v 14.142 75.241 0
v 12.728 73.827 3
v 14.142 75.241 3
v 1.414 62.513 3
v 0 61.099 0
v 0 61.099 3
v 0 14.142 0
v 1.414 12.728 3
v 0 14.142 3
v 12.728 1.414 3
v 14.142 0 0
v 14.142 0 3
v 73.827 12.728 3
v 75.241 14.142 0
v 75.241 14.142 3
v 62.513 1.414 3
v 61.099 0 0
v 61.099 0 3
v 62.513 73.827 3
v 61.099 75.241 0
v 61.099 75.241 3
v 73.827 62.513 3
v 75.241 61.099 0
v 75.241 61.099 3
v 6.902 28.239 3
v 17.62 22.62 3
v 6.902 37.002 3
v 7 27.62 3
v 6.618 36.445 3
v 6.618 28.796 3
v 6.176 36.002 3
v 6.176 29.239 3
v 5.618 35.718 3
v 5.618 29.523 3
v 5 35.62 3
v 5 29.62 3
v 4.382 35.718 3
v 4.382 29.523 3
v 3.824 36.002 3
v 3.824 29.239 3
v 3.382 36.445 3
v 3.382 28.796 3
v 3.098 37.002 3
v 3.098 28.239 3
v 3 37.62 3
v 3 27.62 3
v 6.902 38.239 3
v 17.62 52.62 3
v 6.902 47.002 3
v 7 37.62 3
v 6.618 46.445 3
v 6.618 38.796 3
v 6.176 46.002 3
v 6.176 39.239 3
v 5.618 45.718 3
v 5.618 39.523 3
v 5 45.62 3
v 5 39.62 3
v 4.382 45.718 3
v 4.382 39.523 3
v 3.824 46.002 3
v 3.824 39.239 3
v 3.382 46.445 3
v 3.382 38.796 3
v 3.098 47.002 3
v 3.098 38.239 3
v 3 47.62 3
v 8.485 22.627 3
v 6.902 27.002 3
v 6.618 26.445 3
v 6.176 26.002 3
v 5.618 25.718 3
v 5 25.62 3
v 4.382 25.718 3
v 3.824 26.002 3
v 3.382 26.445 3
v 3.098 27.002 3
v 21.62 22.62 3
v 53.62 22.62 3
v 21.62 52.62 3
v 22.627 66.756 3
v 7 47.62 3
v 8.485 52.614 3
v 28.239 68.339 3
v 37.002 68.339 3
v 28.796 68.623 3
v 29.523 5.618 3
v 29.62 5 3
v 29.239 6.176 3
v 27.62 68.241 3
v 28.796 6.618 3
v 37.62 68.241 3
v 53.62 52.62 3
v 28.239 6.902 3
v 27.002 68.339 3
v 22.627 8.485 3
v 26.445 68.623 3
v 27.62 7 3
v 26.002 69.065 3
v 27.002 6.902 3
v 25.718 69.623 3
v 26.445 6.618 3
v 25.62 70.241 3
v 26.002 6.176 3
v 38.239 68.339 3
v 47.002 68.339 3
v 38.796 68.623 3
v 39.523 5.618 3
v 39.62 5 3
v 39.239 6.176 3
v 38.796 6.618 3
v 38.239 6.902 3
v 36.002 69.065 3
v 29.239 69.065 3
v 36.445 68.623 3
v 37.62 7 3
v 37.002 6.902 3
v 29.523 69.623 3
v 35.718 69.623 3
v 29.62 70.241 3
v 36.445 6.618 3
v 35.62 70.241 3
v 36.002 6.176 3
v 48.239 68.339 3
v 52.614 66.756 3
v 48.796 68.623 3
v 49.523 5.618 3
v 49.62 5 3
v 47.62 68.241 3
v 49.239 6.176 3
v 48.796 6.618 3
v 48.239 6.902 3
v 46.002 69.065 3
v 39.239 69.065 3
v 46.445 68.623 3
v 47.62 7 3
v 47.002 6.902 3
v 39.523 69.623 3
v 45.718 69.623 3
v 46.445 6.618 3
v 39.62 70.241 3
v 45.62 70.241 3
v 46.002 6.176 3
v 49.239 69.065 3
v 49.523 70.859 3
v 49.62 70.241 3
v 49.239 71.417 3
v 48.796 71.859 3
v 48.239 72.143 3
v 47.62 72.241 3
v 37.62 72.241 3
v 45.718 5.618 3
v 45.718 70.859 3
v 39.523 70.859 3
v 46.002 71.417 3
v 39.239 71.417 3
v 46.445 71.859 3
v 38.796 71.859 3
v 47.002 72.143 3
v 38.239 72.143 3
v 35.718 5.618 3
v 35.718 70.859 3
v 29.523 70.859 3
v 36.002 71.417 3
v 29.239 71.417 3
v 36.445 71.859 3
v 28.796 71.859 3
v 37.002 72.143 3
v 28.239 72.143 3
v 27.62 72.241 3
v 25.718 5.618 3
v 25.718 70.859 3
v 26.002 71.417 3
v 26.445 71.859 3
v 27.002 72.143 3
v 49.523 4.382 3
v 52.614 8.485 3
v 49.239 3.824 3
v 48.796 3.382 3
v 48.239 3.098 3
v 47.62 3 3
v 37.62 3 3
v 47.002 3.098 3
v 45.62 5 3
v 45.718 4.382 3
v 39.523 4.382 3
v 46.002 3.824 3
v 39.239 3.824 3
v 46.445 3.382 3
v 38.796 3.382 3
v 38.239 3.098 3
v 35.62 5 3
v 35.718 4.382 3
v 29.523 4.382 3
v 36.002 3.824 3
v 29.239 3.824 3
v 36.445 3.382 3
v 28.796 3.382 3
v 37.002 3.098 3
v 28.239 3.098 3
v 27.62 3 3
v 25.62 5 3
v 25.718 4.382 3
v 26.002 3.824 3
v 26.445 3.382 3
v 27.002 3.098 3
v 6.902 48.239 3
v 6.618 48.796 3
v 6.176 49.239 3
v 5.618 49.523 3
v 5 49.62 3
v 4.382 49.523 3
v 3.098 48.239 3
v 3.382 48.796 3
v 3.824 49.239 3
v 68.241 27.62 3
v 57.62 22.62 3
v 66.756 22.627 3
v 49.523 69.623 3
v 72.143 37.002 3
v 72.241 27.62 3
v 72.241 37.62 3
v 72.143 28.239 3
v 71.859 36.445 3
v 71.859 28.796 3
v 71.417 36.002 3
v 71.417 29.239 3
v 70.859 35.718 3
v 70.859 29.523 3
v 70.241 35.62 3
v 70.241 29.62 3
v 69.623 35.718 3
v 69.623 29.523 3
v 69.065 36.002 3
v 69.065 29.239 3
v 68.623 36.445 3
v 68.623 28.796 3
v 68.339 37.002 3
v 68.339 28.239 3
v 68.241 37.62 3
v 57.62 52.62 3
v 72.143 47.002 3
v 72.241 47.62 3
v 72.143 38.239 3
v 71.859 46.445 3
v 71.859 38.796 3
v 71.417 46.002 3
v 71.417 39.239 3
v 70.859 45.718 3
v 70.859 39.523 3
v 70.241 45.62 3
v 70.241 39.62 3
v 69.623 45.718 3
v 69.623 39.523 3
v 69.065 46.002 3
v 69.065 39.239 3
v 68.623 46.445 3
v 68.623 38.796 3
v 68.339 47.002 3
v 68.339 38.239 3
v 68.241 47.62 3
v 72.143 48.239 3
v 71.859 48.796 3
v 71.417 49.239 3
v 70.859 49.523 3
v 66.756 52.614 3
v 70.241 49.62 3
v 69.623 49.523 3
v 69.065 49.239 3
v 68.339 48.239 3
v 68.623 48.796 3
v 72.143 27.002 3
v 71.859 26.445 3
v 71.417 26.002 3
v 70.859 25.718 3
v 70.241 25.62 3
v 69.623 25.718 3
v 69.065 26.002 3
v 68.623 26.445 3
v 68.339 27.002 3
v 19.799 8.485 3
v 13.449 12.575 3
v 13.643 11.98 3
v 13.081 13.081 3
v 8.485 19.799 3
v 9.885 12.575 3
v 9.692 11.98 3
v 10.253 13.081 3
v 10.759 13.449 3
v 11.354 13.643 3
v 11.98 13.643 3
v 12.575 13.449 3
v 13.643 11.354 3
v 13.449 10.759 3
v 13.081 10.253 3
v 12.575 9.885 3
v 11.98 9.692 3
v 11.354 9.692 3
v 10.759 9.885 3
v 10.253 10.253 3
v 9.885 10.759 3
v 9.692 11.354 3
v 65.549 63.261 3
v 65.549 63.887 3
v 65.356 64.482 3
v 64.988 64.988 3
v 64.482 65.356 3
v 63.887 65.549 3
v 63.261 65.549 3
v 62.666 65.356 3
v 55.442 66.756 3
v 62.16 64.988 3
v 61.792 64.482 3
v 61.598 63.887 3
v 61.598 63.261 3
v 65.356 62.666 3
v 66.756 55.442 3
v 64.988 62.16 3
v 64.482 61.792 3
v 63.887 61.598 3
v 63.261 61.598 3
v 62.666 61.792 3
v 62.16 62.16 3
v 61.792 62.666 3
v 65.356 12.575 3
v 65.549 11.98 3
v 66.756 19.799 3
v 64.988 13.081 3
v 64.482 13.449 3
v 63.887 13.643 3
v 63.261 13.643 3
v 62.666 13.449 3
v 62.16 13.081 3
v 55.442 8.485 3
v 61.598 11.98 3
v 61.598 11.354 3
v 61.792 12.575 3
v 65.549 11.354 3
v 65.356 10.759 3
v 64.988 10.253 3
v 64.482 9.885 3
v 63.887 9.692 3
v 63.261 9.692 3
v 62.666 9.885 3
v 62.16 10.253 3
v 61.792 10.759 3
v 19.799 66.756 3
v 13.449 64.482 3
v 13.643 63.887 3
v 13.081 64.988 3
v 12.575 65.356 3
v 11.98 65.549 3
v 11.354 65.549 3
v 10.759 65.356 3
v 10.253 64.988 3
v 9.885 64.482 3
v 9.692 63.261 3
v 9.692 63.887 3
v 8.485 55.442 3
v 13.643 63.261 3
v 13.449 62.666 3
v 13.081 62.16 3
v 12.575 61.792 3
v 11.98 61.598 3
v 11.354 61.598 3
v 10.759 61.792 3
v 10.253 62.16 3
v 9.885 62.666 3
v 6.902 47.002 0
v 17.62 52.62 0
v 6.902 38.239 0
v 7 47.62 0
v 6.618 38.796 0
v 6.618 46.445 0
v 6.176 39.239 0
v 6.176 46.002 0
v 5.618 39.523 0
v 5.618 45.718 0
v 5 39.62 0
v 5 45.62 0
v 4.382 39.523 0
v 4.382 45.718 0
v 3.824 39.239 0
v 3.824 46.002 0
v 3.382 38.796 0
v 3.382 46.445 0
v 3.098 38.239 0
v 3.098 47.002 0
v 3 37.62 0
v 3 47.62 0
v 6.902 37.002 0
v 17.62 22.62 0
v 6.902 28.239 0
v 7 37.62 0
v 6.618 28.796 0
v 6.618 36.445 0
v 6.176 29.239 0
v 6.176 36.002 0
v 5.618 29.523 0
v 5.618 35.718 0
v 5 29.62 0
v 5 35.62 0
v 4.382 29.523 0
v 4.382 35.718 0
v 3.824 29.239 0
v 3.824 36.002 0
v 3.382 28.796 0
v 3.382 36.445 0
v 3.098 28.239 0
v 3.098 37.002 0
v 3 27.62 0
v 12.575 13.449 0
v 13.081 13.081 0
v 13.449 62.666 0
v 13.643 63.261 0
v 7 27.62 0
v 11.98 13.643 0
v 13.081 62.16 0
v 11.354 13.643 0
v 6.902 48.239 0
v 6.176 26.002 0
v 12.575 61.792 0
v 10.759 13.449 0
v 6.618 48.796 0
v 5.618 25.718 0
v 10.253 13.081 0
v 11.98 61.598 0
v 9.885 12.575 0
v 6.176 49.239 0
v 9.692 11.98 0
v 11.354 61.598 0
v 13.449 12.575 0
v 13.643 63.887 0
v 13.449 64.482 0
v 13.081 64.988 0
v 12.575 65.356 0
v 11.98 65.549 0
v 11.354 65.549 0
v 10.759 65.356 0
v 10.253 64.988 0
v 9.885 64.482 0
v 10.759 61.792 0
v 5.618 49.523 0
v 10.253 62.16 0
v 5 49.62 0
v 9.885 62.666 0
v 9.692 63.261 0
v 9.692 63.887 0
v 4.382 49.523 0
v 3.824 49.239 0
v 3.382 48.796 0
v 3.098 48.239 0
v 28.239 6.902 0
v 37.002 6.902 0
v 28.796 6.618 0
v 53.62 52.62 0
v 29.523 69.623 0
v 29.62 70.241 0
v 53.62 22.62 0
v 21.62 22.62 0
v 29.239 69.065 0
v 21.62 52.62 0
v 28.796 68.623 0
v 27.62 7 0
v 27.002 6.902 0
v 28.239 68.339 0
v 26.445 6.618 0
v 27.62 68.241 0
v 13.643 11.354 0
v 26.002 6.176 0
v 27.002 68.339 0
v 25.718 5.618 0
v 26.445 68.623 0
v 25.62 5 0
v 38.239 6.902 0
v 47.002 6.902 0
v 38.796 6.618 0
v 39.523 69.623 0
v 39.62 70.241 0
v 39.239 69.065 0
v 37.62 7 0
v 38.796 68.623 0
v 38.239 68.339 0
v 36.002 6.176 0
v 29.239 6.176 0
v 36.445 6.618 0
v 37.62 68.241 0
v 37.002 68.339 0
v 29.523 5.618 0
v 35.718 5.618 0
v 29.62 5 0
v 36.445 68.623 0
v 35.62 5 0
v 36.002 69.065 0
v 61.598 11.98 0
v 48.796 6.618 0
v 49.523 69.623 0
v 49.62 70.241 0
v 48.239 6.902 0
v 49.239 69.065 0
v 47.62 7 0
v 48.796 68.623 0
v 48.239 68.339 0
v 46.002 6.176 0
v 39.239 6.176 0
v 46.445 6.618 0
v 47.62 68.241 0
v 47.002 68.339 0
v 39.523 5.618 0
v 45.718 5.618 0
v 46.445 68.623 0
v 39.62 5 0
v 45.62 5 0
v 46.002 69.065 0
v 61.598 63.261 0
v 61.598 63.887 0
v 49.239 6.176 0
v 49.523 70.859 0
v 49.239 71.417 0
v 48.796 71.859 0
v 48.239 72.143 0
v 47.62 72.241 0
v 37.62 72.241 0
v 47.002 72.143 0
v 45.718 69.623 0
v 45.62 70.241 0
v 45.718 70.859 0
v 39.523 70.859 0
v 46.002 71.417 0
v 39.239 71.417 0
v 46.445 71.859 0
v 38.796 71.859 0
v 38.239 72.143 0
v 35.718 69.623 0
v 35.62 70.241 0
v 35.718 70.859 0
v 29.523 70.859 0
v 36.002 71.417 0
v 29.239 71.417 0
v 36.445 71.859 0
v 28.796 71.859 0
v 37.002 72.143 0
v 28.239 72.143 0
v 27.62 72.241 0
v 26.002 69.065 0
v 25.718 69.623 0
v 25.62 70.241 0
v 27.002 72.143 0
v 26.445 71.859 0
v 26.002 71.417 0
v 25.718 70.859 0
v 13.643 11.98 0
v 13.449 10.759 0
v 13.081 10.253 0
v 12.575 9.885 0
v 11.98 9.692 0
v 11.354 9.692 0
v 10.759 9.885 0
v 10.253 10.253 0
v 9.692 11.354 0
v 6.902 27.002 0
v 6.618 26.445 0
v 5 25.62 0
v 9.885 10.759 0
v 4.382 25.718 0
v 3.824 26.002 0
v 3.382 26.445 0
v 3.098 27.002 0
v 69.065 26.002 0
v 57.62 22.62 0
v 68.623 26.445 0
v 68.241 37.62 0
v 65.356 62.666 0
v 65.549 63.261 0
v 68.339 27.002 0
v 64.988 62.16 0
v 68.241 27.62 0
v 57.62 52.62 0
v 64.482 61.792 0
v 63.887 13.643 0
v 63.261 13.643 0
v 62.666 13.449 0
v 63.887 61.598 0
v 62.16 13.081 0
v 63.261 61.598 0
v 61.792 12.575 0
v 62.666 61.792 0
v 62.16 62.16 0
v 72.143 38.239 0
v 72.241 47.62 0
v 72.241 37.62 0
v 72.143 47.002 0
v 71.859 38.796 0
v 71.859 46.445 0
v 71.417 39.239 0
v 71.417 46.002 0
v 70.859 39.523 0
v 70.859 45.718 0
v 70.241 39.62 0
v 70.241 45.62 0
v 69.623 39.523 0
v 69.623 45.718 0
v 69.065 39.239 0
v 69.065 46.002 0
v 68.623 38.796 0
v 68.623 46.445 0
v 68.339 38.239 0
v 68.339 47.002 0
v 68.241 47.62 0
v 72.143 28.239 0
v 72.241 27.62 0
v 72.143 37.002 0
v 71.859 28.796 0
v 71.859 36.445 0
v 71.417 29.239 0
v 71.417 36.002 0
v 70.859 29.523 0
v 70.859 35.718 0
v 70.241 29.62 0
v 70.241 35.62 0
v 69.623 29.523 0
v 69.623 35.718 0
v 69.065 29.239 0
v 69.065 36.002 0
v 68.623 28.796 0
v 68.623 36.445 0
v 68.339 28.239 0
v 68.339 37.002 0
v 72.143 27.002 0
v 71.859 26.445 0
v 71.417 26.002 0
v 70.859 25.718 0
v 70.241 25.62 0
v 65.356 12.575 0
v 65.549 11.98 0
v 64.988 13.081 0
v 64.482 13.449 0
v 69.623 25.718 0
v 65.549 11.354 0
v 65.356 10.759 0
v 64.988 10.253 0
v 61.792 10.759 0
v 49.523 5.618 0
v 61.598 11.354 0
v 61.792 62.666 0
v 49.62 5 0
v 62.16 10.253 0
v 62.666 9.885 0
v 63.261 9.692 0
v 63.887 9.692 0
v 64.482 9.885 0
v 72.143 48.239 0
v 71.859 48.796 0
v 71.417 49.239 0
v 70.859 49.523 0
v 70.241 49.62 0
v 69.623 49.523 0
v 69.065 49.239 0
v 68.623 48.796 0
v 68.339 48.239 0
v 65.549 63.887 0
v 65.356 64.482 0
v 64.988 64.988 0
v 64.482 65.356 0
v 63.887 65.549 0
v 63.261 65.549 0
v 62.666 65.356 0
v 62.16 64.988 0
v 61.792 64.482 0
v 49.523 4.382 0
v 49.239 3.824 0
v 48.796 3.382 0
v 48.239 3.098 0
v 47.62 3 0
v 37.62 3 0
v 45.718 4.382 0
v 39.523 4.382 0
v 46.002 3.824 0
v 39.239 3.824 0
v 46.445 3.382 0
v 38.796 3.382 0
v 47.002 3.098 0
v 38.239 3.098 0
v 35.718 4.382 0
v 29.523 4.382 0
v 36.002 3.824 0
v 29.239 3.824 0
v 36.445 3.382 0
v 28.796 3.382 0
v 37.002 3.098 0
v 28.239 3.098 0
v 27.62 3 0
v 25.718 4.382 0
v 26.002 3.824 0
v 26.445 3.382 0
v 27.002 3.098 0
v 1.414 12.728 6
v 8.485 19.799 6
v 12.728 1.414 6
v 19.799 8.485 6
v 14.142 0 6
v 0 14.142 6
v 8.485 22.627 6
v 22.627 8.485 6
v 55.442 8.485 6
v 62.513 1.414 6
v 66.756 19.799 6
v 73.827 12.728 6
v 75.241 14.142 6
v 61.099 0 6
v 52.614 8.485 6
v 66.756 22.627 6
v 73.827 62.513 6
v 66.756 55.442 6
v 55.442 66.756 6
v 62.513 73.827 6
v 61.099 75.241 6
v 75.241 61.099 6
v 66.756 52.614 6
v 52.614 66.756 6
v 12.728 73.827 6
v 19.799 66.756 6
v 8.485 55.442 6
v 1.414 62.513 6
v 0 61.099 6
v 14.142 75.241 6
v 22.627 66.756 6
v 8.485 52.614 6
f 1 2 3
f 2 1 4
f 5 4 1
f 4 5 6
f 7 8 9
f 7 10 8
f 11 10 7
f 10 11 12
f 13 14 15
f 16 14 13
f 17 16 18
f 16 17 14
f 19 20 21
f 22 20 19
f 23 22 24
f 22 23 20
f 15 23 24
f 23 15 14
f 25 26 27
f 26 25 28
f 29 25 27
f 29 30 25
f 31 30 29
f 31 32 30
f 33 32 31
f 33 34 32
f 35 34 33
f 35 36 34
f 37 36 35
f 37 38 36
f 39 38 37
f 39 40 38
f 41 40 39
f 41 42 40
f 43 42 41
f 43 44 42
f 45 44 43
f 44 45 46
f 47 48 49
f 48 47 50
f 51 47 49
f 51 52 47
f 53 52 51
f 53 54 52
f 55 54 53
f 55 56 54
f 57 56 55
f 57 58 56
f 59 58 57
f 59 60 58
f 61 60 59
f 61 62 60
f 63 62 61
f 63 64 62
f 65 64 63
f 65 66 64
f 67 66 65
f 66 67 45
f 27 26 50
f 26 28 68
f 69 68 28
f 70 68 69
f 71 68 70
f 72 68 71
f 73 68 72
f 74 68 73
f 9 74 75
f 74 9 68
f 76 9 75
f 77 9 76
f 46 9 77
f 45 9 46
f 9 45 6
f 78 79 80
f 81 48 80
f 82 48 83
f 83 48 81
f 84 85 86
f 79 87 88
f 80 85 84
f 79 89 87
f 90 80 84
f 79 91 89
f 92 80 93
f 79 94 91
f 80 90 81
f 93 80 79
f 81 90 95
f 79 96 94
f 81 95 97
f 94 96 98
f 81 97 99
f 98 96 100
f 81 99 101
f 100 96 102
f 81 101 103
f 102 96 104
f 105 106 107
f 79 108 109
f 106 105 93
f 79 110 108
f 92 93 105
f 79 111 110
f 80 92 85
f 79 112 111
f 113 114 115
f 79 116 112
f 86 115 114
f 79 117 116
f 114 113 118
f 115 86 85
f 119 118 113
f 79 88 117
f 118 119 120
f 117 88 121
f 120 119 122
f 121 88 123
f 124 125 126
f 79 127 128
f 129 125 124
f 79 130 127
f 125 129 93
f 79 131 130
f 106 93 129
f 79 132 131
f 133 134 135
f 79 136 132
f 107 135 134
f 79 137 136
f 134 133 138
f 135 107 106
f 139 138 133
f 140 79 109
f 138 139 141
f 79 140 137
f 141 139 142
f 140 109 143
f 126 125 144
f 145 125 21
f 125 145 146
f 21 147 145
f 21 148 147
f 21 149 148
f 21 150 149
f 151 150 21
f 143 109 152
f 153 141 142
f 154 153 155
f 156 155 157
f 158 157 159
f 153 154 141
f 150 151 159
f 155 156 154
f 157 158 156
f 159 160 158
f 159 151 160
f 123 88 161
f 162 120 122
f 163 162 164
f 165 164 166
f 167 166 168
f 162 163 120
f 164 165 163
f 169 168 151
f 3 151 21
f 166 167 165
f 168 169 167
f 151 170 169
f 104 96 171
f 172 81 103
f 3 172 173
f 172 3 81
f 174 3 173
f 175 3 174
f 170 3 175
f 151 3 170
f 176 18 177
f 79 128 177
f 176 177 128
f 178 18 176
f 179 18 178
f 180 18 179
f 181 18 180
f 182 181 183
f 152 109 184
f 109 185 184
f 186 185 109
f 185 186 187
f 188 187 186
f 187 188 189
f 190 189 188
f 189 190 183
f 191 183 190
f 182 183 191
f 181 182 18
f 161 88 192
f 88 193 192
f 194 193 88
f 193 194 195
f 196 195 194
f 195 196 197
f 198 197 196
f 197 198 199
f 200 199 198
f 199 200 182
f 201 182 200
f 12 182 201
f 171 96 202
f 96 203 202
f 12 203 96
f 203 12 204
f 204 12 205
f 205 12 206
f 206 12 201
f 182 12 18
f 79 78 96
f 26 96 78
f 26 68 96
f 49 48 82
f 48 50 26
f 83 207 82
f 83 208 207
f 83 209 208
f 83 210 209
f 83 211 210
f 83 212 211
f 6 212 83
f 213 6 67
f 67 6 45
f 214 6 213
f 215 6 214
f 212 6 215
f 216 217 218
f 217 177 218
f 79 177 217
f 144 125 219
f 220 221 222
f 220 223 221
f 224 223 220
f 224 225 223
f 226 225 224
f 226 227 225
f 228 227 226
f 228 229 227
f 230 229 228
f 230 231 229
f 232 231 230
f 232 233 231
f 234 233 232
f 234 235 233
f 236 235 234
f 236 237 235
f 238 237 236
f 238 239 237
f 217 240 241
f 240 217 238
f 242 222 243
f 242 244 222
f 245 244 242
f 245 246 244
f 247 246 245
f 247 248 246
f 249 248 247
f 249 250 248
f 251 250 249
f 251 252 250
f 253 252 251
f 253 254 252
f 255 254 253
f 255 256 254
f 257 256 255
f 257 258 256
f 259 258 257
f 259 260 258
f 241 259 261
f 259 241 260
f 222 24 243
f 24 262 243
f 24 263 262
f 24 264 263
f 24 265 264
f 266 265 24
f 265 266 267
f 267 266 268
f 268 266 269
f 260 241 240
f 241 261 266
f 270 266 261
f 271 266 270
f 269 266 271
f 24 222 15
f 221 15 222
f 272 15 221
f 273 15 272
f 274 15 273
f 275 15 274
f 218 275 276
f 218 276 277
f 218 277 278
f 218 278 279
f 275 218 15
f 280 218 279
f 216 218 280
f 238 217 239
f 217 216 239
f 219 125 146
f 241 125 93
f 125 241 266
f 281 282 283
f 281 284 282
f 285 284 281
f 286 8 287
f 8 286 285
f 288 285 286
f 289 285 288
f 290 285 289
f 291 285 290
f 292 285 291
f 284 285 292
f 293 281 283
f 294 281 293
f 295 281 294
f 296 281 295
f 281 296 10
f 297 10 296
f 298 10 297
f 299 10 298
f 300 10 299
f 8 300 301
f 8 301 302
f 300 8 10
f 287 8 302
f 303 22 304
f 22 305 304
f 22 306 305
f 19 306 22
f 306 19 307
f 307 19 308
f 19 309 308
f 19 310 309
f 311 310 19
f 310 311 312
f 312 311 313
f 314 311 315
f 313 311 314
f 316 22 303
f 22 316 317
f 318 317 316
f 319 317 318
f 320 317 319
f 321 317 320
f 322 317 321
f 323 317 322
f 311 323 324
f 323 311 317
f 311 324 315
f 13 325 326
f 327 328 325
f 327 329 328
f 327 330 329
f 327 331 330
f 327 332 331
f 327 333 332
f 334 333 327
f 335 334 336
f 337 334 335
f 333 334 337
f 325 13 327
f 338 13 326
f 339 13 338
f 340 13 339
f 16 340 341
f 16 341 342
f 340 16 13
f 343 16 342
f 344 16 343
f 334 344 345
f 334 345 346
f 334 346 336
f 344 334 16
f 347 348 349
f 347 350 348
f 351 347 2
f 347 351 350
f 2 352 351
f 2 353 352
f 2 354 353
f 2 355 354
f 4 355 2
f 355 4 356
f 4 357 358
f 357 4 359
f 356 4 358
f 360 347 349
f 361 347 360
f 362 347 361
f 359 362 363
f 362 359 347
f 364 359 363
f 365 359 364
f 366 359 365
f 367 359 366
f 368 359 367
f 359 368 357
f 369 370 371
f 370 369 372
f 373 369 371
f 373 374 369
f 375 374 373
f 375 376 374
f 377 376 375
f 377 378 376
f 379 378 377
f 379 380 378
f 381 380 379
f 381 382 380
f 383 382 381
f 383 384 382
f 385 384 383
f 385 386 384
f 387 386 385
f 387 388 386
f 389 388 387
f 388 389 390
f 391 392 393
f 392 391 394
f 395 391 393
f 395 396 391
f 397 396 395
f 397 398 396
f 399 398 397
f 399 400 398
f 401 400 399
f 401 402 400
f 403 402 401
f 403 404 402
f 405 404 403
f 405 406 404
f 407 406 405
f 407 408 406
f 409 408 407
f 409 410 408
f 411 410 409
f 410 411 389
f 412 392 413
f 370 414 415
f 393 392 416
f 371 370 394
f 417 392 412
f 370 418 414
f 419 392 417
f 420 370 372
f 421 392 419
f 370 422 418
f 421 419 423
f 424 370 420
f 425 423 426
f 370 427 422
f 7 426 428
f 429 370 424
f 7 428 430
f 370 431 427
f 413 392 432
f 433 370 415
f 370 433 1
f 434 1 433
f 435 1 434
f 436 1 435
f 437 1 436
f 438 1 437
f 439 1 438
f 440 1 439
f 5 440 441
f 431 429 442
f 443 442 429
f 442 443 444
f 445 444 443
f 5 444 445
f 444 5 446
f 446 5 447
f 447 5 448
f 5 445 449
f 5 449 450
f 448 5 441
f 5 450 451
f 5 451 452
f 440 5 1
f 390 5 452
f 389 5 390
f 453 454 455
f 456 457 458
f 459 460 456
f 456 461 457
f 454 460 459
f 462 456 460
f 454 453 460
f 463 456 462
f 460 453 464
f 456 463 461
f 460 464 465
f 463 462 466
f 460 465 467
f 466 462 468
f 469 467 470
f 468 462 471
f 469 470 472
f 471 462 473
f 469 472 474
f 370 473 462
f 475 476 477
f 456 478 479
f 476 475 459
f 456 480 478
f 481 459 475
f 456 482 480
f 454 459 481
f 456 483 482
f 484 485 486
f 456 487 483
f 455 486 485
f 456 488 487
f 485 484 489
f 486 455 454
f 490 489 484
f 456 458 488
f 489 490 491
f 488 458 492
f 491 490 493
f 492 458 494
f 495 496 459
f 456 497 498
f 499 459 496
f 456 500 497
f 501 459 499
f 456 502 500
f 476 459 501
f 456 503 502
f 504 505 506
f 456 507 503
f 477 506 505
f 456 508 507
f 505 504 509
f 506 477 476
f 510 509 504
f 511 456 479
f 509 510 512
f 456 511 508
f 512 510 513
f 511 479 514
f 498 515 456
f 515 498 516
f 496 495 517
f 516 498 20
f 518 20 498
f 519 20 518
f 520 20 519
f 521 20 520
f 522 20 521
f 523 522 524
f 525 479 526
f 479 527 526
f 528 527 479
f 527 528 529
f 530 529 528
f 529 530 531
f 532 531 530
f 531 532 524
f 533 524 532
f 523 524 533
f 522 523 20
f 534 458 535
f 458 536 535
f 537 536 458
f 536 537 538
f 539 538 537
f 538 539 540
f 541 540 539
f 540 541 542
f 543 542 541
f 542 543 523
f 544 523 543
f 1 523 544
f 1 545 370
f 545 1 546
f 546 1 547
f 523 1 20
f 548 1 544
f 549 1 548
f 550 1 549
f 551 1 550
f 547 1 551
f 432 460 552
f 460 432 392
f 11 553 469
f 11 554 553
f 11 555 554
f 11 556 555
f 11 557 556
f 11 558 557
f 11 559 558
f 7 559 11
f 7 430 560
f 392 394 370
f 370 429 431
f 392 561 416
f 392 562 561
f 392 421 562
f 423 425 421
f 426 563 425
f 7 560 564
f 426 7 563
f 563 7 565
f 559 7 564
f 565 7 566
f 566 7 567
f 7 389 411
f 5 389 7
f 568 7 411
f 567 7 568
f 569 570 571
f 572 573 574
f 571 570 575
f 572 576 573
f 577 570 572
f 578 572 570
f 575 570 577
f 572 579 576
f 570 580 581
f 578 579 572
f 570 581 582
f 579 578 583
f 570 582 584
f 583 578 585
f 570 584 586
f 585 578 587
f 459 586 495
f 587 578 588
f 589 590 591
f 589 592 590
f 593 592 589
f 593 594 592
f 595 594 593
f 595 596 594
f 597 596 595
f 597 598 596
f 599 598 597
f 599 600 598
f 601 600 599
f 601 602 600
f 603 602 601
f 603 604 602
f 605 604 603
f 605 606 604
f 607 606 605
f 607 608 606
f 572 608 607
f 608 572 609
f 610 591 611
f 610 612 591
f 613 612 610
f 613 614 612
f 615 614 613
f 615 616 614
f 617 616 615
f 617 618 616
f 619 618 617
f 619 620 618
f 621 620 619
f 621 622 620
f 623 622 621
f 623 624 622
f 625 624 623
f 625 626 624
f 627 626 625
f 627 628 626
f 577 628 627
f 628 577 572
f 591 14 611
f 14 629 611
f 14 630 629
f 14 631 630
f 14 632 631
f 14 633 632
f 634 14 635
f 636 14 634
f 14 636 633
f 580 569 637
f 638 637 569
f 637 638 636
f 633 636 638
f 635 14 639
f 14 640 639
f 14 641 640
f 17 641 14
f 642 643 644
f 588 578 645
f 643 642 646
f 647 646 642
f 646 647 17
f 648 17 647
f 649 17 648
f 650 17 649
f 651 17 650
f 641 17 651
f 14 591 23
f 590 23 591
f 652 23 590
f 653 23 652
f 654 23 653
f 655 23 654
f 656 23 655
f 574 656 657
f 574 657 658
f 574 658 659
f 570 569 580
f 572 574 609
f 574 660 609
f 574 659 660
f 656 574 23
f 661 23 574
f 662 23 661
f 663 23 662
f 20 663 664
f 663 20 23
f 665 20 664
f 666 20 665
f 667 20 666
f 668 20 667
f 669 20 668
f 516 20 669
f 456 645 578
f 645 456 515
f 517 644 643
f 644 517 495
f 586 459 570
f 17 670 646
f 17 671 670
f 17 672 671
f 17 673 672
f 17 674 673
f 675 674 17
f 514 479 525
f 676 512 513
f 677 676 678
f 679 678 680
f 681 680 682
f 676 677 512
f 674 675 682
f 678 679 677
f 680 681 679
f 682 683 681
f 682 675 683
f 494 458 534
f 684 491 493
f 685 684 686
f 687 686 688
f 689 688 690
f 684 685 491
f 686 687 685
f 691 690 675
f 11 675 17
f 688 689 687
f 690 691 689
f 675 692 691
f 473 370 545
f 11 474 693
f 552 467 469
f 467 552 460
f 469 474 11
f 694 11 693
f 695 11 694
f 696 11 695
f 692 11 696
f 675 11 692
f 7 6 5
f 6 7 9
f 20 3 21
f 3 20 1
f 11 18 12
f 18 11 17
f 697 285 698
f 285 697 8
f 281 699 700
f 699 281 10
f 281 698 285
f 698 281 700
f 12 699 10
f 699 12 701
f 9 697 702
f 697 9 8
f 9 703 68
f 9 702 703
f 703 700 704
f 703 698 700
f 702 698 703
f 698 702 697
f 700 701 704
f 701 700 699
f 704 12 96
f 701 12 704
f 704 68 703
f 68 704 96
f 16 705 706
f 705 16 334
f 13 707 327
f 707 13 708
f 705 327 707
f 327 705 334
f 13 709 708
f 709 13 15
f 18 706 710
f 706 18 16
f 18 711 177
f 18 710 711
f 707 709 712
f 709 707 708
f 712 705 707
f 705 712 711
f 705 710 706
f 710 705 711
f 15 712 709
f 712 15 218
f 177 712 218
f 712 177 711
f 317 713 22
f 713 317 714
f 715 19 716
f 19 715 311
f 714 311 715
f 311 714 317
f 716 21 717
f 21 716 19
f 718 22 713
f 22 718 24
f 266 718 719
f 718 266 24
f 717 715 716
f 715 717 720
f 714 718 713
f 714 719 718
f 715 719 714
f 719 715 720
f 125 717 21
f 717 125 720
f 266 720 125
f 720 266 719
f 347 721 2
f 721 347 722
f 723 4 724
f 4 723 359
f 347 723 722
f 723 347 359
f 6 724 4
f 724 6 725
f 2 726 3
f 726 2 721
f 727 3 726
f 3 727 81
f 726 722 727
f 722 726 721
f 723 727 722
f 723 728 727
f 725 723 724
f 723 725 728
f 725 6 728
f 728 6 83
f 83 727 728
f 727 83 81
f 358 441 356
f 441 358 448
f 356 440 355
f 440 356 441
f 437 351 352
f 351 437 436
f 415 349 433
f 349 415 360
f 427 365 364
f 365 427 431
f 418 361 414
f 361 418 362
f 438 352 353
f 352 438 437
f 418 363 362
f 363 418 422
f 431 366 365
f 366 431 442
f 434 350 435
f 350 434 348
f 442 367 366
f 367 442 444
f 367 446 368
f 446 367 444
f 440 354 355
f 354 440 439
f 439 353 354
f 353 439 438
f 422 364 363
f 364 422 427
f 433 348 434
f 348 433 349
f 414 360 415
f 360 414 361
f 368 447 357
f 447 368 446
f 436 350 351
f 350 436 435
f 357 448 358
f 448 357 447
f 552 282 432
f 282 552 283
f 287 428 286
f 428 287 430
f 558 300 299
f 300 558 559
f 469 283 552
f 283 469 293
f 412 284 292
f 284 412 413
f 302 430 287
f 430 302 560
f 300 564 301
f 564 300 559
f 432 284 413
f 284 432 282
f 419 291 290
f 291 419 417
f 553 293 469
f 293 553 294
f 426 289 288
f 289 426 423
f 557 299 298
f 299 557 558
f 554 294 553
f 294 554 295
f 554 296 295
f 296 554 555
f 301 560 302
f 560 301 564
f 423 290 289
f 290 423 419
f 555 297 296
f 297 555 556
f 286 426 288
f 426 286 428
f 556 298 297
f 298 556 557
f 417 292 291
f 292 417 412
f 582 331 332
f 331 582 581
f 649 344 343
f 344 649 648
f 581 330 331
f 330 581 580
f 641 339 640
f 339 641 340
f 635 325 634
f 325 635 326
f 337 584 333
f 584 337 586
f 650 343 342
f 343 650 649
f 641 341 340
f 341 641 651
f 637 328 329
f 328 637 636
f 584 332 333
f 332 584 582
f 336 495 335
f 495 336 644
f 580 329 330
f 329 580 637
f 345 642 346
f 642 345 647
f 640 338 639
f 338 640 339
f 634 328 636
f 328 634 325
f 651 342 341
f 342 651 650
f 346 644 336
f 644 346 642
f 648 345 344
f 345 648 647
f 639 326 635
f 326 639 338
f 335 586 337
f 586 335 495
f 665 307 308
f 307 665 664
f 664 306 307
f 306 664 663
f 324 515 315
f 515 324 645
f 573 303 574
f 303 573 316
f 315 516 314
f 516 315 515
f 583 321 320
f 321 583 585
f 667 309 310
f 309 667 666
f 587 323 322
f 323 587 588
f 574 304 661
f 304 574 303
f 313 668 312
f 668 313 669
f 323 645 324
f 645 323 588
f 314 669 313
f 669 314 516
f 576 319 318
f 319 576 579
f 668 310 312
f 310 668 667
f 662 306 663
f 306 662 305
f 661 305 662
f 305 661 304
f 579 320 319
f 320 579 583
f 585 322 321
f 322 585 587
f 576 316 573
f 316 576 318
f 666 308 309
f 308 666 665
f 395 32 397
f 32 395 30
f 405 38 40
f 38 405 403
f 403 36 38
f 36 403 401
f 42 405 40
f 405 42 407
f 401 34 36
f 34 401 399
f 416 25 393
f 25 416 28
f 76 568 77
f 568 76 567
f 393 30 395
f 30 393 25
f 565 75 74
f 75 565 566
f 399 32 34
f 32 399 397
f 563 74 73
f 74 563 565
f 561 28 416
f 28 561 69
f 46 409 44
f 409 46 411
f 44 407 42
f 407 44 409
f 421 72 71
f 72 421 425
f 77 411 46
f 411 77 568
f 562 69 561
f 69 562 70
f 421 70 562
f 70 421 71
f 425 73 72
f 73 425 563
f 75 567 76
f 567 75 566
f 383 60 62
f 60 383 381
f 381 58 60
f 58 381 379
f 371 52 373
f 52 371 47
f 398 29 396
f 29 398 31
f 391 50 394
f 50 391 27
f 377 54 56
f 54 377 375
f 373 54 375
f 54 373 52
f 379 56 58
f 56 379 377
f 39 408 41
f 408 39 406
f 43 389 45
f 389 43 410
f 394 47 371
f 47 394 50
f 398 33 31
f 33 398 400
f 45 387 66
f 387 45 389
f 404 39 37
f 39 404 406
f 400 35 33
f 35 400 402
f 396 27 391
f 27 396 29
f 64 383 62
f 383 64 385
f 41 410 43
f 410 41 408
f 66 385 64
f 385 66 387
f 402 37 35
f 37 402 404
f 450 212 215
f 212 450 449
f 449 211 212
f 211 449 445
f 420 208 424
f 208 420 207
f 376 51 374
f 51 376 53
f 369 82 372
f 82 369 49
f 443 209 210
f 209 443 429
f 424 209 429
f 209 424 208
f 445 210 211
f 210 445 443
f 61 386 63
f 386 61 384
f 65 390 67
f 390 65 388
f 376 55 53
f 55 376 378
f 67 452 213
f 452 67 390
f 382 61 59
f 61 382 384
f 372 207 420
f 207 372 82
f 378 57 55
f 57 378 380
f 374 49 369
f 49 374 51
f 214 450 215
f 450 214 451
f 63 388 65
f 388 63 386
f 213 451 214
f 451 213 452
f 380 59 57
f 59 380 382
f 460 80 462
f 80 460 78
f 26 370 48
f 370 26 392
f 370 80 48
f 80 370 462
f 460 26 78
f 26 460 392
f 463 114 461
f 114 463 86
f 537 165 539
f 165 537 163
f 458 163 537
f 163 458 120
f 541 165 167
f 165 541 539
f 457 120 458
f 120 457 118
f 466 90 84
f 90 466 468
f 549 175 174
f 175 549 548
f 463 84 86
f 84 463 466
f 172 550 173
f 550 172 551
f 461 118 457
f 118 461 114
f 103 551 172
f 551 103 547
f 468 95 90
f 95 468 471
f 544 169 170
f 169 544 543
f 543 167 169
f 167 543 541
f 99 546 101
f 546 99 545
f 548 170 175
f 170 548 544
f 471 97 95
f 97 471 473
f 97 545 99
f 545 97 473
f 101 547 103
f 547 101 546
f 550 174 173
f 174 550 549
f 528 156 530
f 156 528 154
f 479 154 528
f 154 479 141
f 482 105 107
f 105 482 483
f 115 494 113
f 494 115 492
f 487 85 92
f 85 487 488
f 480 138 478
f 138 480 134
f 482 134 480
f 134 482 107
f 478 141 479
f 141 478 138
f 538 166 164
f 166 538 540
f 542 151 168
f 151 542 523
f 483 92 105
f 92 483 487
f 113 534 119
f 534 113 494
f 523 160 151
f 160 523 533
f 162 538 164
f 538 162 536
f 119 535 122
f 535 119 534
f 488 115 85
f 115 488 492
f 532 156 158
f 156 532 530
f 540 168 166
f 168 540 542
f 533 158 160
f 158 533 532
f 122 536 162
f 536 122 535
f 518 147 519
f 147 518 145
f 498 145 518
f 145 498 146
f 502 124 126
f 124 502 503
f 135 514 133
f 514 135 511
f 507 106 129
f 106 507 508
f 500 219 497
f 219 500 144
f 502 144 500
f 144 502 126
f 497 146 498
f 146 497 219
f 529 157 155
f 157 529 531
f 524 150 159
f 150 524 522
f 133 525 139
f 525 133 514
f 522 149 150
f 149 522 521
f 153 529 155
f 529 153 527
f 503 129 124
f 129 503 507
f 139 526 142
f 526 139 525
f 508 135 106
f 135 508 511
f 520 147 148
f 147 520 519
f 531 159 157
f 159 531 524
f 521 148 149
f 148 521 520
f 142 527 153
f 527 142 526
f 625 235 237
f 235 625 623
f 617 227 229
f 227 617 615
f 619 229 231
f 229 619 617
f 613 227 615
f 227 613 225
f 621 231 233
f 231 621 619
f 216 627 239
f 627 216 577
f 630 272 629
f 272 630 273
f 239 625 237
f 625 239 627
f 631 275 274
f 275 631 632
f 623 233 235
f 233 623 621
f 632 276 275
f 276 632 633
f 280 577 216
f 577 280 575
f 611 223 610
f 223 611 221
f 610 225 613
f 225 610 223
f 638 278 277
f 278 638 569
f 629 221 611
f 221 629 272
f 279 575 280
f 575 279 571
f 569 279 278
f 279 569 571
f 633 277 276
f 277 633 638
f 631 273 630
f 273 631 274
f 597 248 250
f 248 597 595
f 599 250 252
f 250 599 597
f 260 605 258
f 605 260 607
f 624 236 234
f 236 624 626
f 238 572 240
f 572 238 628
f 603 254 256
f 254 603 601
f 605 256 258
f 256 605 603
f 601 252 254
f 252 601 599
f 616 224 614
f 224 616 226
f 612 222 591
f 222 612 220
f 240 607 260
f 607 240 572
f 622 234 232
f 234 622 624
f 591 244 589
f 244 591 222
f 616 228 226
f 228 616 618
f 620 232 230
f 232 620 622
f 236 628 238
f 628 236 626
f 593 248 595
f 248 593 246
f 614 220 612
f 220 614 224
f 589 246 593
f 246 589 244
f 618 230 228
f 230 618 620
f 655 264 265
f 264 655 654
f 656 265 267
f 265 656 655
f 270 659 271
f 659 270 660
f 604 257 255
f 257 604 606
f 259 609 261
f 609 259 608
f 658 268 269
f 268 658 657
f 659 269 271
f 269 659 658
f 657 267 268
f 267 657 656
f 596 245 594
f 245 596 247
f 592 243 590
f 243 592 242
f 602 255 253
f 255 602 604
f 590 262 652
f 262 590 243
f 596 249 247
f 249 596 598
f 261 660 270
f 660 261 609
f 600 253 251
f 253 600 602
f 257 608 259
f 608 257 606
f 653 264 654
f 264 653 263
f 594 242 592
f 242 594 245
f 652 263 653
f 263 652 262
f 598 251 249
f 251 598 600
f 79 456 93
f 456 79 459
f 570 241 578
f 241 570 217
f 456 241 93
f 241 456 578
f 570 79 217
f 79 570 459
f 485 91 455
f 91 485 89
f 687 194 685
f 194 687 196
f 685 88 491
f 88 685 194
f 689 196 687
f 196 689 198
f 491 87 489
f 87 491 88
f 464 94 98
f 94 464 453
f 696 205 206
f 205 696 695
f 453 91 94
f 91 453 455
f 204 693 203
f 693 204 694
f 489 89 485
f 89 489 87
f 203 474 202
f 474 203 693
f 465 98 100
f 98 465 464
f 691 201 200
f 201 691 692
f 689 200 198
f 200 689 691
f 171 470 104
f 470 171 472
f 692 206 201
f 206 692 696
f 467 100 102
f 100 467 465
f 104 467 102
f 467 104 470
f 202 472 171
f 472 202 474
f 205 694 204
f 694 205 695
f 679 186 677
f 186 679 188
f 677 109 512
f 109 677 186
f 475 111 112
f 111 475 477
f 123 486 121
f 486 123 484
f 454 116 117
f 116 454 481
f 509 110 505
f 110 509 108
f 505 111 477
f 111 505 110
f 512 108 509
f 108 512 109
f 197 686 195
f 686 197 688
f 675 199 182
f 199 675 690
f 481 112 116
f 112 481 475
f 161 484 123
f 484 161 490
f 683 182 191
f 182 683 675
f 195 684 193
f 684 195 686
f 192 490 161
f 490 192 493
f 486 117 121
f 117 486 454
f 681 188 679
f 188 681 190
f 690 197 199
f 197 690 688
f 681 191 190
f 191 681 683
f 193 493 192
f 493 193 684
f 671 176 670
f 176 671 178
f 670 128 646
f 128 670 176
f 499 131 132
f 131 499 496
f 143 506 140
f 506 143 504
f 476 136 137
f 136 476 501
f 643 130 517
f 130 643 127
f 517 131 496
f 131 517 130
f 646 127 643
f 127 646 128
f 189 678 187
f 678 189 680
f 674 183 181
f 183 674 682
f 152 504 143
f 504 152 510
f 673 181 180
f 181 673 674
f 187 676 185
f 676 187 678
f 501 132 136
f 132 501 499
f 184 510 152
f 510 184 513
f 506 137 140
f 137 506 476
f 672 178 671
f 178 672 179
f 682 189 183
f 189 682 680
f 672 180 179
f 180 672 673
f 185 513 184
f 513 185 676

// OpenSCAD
// file: grid.scad
module grid(rows, columns, distance)
{
    for(x = [0:rows-1])
    {
        for(y = [0:columns-1])
        {
            translate([distance*x, distance*y, 0])
            children();
        }
    }
}
// file: brackets.scad
//Creates a bracket that looks like this:
/*
 *      #     |
 *      #     | length
 *      #     |
 *  ######### | | boomWidth
 *  ---------
 *    width
 */
module oldTBracket(boomWidth, width, length, height) 
{
    //xAxis boom
    cube([width, boomWidth, height]);

    //yAxis boom
    translate([width/2 - boomWidth / 2, 0,0])
    cube([boomWidth, length, height]);
}


module tBracket(boomWidth, width, length, height) 
{
    topHeight = 5;
    //xAxis boom
    cube([width, boomWidth, height]);
    
    translate([0,0,height-topHeight])
    cube([width, length, topHeight]);

    //yAxis boom
    translate([width/2 - boomWidth / 2, 0,0])
    cube([boomWidth, length, height]);
}
// main file
include <brackets.scad>
include <grid.scad>

$fn=20;

module bodyPlate(plateSize, thickness, bracketSize)
{
    //calculating the offset of the chamfer for the brackets
    chamferOffset = bracketSize[0] / 2;


    difference()
    {
        cube([plateSize, plateSize, thickness]);

        //Cutting off the corners
        translate([plateSize / 2, plateSize / 2, 0])
        for(r = [1:4])
        {
            rotate(45+r*90)
            {
                translate([sqrt(2 * pow(plateSize / 2, 2)) - chamferOffset, -20, -1])
                cube(40, 100, 10);
            }
        }
    }
}

BRACKET_MARGIN = 1;
function addInnerMargin(innerDimensions) = [
            innerDimensions[0] + BRACKET_MARGIN,
            innerDimensions[1],
            innerDimensions[2]
            ];
function addInnerMarginToBoom(boomWidth) = boomWidth + BRACKET_MARGIN;

module topArmBracket(outsideSize, innerDimensions, bottomBracketHeight, backWallWidth)
{
    barWidth = addInnerMarginToBoom(5);

    innerDimensions = addInnerMargin(innerDimensions);
    
    bracketZOffset = outsideSize[2] - (innerDimensions[2] - bottomBracketHeight);
    
    translate([-outsideSize[0] / 2, 0, 0])
    difference()
    {
        cube(outsideSize);
        
        //Flip the bracket upside down
        translate([0, 0, bracketZOffset])
        mirror([0,0,1])
        translate([0, 0, -innerDimensions[2]])
        //Moving the bracket to the right position inside the cube
        translate([outsideSize[0] / 2 - innerDimensions[0] / 2, backWallWidth, 0])
        //Moving the bracket to the right height
        tBracket(barWidth, innerDimensions[0], innerDimensions[1], innerDimensions[2]);
    }
}
module bottomArmBracket(outsideSize, innerDimensions, backWallWidth)
{
    barWidth = addInnerMarginToBoom(5);

    innerDimensions = addInnerMargin(innerDimensions);
    
    translate([-outsideSize[0] / 2, 0, 0])
    difference()
    {
        cube(outsideSize);

        translate([outsideSize[0] / 2 - innerDimensions[0] / 2, backWallWidth, 0])
        tBracket(barWidth, innerDimensions[0], innerDimensions[1], innerDimensions[2]);
    }
}
function getBracketOffset(plateSize, outsideSize) = sqrt(2* pow(plateSize / 2, 2)) - outsideSize[0] / 2 - outsideSize[1];
module armBrackets(outsideSize, plateSize, plateThickness)
{
    bracketOffset = getBracketOffset(plateSize, outsideSize);
    echo(bracketOffset);
    //Translate to the middle of the plate
    translate([plateSize / 2, plateSize / 2, plateThickness])
    for(i = [1:4])
    {
        rotate(45+90*i)
        {
            translate([0, bracketOffset, 0])
            {
                children(0);
            }
        }
    }
}
module bracketHoles(plateSize, bracketOutsideSize, diameter, bracketWallWidth, bracketBarWidth)
{
    bracketOffset = getBracketOffset(plateSize, bracketOutsideSize);
    
    holeOffset = bracketWallWidth + bracketBarWidth / 2;

    //Translate the whole thing to the center of the plate
    translate([plateSize/2, plateSize/2, 0])
    for(i = [1:4])
    {
        rotate(45 + i*90)
        translate([bracketOffset + holeOffset, 0, -1])
        cylinder(d=diameter, h=25);
    }
}

module screwholeGrid(rows, columns, distance, height)
{
    holeDiameter = 4;

    grid(rows, columns, distance)
    cylinder(d=holeDiameter, h=height);
    
}
module extensionPlate(width, length, bottomThickness)
{
    chamferDistance = 3;
    //center it on the x - axis
    difference()
    {
        translate([-width/2, 0, 0])
        cube([width, length, bottomThickness]);

        //Cutting off the corners
        for(i = [0,1])
        {
            mirror([i,0,0])
            translate([width/2 - chamferDistance, length - chamferDistance, -1])
            rotate(45)
            translate([0, -10, 0])
            cube([20, 20, 20]);
        }
    }
}
module receiverPlate(width, length, bottomThickness, gridDistance, screwDiameter, holeEdgeDistance)
{
    //Calculating how many rows and columns can fit on the receiver
    screwRowAmount = 1;
    screwColumnAmount = floor((length - holeEdgeDistance) / gridDistance);

    difference()
    {
        extensionPlate(width, length, bottomThickness);

        //Screwholes
        //Move to the center
        translate([0, length / 2, 0])
        {
            for(i = [0,1])
            {
                mirror([i, 0, 0])
                //Move to the center
                translate([(width - holeEdgeDistance * 2)/2, -gridDistance * (screwColumnAmount-1) / 2, -1])
                screwholeGrid(screwRowAmount, screwColumnAmount, gridDistance, bottomThickness * 2);
            }
        }
    }
}
module gridPlate(width, length, bottomThickness, gridDistance, screwDiameter, holeEdgeDistance)
{
    //Calculating how many rows and columns can fit on the receiver
    screwRowAmount = floor((width) / gridDistance);
    screwColumnAmount = floor((length - holeEdgeDistance) / gridDistance);


    difference()
    {
        extensionPlate(width, length, bottomThickness);

        //Screwholes
        //Move to the center
        translate([0, length / 2, 0])
        {
            translate([-gridDistance * (screwRowAmount - 1) / 2, -gridDistance * (screwColumnAmount - 1) / 2, -1])
            screwholeGrid(screwRowAmount, screwColumnAmount, gridDistance, bottomThickness * 2);
        }
    }
}

FC_SIZE = 40;
FC_ADDED = 4;
A_BRACKET_OUTSIDE = [20,12, 10];
A_TOP_BRACKET_OUTSIDE = [20,12, 3];
A_BRACKET_BACK_WALL = 2;
A_BRACKET_INSIDE = [15, 10, 13];
A_BRACKET_HEIGHT = 13;
A_BRACKET_BOOM_WIDTH = 7;
A_SCREW_DIAMETER = 4;

B_THICKNESS = 3;

RECEIVERPLATE_WIDTH = 40;
RECEIVERPLATE_LENGTH = 25;

GRIDPLATE_WIDTH = 30;
GRIDPLATE_LENGTH = 25;

SCREWGRID_DISTANCE = 10;
SCREWGRID_DIAMETER = 4;
MIN_HOLE_DISTANCE = 4;

PLATE_SIZE = FC_SIZE + FC_ADDED + 2 * sqrt(pow(A_BRACKET_OUTSIDE[0] / 2, 2) + pow(A_BRACKET_OUTSIDE[1], 2));

module basePlate()
{
    difference()
    {
        union()
        {
            bodyPlate(PLATE_SIZE, B_THICKNESS, A_BRACKET_OUTSIDE);

            //armBrackets(A_BRACKET_OUTSIDE, PLATE_SIZE, B_THICKNESS)
            //bottomArmBracket(A_BRACKET_OUTSIDE, A_BRACKET_INSIDE, A_BRACKET_BACK_WALL);
            //Arm brackets
            children(0)
            children(1);
        }

        bracketHoles(PLATE_SIZE, A_BRACKET_OUTSIDE, A_SCREW_DIAMETER, A_BRACKET_BACK_WALL, A_BRACKET_BOOM_WIDTH);
    }
}

module bottomPlate()
{
    basePlate()
    armBrackets(A_BRACKET_OUTSIDE, PLATE_SIZE, B_THICKNESS)
    bottomArmBracket(A_BRACKET_OUTSIDE, A_BRACKET_INSIDE, A_BRACKET_BACK_WALL);

    //Reciever mounting thingy
    translate([PLATE_SIZE / 2, PLATE_SIZE, 0])
    {
        receiverPlate(
                RECEIVERPLATE_WIDTH,
                RECEIVERPLATE_LENGTH,
                B_THICKNESS,
                SCREWGRID_DISTANCE,
                SCREWGRID_DIAMETER,
                MIN_HOLE_DISTANCE
            );
    }
    translate([PLATE_SIZE / 2, 0, 0])
    {
        rotate(180)
        gridPlate(
                GRIDPLATE_WIDTH,
                GRIDPLATE_LENGTH,
                B_THICKNESS,
                SCREWGRID_DISTANCE,
                SCREWGRID_DIAMETER,
                MIN_HOLE_DISTANCE
            );
    }
}
module topPlate()
{
    bSlotLength = 30;
    bSlotWidth = 4;
    bSlotDistance = 40;

    screwRows = 3;
    screwEdgeDistance = 5;

    difference()
    {
        basePlate()
        armBrackets(A_TOP_BRACKET_OUTSIDE, PLATE_SIZE, B_THICKNESS)
        topArmBracket(A_TOP_BRACKET_OUTSIDE, A_BRACKET_INSIDE, A_BRACKET_OUTSIDE[2], A_BRACKET_BACK_WALL);
        
        translate([PLATE_SIZE / 2, PLATE_SIZE / 2, 0])
        for(i = [0,1])
        {
            mirror([i,0,0])
            {
                translate([-bSlotDistance / 2, -bSlotLength/2, -1])
                cube([bSlotWidth, bSlotLength, B_THICKNESS + 2]);
                
                rotate(90)
                translate([-((screwRows-1) * SCREWGRID_DISTANCE / 2), (PLATE_SIZE - screwEdgeDistance * 2)/2, -1])
                screwholeGrid(screwRows, 1, SCREWGRID_DISTANCE, B_THICKNESS * 2);
            }
            mirror([0,i,0])
            {
                translate([-((screwRows-1) * SCREWGRID_DISTANCE / 2), (PLATE_SIZE - screwEdgeDistance * 2)/2, -1])
                screwholeGrid(screwRows, 1, SCREWGRID_DISTANCE, B_THICKNESS * 2);
            }
        }
    }

}

bottomPlate();
translate([80, 80, 0])
!topPlate();
